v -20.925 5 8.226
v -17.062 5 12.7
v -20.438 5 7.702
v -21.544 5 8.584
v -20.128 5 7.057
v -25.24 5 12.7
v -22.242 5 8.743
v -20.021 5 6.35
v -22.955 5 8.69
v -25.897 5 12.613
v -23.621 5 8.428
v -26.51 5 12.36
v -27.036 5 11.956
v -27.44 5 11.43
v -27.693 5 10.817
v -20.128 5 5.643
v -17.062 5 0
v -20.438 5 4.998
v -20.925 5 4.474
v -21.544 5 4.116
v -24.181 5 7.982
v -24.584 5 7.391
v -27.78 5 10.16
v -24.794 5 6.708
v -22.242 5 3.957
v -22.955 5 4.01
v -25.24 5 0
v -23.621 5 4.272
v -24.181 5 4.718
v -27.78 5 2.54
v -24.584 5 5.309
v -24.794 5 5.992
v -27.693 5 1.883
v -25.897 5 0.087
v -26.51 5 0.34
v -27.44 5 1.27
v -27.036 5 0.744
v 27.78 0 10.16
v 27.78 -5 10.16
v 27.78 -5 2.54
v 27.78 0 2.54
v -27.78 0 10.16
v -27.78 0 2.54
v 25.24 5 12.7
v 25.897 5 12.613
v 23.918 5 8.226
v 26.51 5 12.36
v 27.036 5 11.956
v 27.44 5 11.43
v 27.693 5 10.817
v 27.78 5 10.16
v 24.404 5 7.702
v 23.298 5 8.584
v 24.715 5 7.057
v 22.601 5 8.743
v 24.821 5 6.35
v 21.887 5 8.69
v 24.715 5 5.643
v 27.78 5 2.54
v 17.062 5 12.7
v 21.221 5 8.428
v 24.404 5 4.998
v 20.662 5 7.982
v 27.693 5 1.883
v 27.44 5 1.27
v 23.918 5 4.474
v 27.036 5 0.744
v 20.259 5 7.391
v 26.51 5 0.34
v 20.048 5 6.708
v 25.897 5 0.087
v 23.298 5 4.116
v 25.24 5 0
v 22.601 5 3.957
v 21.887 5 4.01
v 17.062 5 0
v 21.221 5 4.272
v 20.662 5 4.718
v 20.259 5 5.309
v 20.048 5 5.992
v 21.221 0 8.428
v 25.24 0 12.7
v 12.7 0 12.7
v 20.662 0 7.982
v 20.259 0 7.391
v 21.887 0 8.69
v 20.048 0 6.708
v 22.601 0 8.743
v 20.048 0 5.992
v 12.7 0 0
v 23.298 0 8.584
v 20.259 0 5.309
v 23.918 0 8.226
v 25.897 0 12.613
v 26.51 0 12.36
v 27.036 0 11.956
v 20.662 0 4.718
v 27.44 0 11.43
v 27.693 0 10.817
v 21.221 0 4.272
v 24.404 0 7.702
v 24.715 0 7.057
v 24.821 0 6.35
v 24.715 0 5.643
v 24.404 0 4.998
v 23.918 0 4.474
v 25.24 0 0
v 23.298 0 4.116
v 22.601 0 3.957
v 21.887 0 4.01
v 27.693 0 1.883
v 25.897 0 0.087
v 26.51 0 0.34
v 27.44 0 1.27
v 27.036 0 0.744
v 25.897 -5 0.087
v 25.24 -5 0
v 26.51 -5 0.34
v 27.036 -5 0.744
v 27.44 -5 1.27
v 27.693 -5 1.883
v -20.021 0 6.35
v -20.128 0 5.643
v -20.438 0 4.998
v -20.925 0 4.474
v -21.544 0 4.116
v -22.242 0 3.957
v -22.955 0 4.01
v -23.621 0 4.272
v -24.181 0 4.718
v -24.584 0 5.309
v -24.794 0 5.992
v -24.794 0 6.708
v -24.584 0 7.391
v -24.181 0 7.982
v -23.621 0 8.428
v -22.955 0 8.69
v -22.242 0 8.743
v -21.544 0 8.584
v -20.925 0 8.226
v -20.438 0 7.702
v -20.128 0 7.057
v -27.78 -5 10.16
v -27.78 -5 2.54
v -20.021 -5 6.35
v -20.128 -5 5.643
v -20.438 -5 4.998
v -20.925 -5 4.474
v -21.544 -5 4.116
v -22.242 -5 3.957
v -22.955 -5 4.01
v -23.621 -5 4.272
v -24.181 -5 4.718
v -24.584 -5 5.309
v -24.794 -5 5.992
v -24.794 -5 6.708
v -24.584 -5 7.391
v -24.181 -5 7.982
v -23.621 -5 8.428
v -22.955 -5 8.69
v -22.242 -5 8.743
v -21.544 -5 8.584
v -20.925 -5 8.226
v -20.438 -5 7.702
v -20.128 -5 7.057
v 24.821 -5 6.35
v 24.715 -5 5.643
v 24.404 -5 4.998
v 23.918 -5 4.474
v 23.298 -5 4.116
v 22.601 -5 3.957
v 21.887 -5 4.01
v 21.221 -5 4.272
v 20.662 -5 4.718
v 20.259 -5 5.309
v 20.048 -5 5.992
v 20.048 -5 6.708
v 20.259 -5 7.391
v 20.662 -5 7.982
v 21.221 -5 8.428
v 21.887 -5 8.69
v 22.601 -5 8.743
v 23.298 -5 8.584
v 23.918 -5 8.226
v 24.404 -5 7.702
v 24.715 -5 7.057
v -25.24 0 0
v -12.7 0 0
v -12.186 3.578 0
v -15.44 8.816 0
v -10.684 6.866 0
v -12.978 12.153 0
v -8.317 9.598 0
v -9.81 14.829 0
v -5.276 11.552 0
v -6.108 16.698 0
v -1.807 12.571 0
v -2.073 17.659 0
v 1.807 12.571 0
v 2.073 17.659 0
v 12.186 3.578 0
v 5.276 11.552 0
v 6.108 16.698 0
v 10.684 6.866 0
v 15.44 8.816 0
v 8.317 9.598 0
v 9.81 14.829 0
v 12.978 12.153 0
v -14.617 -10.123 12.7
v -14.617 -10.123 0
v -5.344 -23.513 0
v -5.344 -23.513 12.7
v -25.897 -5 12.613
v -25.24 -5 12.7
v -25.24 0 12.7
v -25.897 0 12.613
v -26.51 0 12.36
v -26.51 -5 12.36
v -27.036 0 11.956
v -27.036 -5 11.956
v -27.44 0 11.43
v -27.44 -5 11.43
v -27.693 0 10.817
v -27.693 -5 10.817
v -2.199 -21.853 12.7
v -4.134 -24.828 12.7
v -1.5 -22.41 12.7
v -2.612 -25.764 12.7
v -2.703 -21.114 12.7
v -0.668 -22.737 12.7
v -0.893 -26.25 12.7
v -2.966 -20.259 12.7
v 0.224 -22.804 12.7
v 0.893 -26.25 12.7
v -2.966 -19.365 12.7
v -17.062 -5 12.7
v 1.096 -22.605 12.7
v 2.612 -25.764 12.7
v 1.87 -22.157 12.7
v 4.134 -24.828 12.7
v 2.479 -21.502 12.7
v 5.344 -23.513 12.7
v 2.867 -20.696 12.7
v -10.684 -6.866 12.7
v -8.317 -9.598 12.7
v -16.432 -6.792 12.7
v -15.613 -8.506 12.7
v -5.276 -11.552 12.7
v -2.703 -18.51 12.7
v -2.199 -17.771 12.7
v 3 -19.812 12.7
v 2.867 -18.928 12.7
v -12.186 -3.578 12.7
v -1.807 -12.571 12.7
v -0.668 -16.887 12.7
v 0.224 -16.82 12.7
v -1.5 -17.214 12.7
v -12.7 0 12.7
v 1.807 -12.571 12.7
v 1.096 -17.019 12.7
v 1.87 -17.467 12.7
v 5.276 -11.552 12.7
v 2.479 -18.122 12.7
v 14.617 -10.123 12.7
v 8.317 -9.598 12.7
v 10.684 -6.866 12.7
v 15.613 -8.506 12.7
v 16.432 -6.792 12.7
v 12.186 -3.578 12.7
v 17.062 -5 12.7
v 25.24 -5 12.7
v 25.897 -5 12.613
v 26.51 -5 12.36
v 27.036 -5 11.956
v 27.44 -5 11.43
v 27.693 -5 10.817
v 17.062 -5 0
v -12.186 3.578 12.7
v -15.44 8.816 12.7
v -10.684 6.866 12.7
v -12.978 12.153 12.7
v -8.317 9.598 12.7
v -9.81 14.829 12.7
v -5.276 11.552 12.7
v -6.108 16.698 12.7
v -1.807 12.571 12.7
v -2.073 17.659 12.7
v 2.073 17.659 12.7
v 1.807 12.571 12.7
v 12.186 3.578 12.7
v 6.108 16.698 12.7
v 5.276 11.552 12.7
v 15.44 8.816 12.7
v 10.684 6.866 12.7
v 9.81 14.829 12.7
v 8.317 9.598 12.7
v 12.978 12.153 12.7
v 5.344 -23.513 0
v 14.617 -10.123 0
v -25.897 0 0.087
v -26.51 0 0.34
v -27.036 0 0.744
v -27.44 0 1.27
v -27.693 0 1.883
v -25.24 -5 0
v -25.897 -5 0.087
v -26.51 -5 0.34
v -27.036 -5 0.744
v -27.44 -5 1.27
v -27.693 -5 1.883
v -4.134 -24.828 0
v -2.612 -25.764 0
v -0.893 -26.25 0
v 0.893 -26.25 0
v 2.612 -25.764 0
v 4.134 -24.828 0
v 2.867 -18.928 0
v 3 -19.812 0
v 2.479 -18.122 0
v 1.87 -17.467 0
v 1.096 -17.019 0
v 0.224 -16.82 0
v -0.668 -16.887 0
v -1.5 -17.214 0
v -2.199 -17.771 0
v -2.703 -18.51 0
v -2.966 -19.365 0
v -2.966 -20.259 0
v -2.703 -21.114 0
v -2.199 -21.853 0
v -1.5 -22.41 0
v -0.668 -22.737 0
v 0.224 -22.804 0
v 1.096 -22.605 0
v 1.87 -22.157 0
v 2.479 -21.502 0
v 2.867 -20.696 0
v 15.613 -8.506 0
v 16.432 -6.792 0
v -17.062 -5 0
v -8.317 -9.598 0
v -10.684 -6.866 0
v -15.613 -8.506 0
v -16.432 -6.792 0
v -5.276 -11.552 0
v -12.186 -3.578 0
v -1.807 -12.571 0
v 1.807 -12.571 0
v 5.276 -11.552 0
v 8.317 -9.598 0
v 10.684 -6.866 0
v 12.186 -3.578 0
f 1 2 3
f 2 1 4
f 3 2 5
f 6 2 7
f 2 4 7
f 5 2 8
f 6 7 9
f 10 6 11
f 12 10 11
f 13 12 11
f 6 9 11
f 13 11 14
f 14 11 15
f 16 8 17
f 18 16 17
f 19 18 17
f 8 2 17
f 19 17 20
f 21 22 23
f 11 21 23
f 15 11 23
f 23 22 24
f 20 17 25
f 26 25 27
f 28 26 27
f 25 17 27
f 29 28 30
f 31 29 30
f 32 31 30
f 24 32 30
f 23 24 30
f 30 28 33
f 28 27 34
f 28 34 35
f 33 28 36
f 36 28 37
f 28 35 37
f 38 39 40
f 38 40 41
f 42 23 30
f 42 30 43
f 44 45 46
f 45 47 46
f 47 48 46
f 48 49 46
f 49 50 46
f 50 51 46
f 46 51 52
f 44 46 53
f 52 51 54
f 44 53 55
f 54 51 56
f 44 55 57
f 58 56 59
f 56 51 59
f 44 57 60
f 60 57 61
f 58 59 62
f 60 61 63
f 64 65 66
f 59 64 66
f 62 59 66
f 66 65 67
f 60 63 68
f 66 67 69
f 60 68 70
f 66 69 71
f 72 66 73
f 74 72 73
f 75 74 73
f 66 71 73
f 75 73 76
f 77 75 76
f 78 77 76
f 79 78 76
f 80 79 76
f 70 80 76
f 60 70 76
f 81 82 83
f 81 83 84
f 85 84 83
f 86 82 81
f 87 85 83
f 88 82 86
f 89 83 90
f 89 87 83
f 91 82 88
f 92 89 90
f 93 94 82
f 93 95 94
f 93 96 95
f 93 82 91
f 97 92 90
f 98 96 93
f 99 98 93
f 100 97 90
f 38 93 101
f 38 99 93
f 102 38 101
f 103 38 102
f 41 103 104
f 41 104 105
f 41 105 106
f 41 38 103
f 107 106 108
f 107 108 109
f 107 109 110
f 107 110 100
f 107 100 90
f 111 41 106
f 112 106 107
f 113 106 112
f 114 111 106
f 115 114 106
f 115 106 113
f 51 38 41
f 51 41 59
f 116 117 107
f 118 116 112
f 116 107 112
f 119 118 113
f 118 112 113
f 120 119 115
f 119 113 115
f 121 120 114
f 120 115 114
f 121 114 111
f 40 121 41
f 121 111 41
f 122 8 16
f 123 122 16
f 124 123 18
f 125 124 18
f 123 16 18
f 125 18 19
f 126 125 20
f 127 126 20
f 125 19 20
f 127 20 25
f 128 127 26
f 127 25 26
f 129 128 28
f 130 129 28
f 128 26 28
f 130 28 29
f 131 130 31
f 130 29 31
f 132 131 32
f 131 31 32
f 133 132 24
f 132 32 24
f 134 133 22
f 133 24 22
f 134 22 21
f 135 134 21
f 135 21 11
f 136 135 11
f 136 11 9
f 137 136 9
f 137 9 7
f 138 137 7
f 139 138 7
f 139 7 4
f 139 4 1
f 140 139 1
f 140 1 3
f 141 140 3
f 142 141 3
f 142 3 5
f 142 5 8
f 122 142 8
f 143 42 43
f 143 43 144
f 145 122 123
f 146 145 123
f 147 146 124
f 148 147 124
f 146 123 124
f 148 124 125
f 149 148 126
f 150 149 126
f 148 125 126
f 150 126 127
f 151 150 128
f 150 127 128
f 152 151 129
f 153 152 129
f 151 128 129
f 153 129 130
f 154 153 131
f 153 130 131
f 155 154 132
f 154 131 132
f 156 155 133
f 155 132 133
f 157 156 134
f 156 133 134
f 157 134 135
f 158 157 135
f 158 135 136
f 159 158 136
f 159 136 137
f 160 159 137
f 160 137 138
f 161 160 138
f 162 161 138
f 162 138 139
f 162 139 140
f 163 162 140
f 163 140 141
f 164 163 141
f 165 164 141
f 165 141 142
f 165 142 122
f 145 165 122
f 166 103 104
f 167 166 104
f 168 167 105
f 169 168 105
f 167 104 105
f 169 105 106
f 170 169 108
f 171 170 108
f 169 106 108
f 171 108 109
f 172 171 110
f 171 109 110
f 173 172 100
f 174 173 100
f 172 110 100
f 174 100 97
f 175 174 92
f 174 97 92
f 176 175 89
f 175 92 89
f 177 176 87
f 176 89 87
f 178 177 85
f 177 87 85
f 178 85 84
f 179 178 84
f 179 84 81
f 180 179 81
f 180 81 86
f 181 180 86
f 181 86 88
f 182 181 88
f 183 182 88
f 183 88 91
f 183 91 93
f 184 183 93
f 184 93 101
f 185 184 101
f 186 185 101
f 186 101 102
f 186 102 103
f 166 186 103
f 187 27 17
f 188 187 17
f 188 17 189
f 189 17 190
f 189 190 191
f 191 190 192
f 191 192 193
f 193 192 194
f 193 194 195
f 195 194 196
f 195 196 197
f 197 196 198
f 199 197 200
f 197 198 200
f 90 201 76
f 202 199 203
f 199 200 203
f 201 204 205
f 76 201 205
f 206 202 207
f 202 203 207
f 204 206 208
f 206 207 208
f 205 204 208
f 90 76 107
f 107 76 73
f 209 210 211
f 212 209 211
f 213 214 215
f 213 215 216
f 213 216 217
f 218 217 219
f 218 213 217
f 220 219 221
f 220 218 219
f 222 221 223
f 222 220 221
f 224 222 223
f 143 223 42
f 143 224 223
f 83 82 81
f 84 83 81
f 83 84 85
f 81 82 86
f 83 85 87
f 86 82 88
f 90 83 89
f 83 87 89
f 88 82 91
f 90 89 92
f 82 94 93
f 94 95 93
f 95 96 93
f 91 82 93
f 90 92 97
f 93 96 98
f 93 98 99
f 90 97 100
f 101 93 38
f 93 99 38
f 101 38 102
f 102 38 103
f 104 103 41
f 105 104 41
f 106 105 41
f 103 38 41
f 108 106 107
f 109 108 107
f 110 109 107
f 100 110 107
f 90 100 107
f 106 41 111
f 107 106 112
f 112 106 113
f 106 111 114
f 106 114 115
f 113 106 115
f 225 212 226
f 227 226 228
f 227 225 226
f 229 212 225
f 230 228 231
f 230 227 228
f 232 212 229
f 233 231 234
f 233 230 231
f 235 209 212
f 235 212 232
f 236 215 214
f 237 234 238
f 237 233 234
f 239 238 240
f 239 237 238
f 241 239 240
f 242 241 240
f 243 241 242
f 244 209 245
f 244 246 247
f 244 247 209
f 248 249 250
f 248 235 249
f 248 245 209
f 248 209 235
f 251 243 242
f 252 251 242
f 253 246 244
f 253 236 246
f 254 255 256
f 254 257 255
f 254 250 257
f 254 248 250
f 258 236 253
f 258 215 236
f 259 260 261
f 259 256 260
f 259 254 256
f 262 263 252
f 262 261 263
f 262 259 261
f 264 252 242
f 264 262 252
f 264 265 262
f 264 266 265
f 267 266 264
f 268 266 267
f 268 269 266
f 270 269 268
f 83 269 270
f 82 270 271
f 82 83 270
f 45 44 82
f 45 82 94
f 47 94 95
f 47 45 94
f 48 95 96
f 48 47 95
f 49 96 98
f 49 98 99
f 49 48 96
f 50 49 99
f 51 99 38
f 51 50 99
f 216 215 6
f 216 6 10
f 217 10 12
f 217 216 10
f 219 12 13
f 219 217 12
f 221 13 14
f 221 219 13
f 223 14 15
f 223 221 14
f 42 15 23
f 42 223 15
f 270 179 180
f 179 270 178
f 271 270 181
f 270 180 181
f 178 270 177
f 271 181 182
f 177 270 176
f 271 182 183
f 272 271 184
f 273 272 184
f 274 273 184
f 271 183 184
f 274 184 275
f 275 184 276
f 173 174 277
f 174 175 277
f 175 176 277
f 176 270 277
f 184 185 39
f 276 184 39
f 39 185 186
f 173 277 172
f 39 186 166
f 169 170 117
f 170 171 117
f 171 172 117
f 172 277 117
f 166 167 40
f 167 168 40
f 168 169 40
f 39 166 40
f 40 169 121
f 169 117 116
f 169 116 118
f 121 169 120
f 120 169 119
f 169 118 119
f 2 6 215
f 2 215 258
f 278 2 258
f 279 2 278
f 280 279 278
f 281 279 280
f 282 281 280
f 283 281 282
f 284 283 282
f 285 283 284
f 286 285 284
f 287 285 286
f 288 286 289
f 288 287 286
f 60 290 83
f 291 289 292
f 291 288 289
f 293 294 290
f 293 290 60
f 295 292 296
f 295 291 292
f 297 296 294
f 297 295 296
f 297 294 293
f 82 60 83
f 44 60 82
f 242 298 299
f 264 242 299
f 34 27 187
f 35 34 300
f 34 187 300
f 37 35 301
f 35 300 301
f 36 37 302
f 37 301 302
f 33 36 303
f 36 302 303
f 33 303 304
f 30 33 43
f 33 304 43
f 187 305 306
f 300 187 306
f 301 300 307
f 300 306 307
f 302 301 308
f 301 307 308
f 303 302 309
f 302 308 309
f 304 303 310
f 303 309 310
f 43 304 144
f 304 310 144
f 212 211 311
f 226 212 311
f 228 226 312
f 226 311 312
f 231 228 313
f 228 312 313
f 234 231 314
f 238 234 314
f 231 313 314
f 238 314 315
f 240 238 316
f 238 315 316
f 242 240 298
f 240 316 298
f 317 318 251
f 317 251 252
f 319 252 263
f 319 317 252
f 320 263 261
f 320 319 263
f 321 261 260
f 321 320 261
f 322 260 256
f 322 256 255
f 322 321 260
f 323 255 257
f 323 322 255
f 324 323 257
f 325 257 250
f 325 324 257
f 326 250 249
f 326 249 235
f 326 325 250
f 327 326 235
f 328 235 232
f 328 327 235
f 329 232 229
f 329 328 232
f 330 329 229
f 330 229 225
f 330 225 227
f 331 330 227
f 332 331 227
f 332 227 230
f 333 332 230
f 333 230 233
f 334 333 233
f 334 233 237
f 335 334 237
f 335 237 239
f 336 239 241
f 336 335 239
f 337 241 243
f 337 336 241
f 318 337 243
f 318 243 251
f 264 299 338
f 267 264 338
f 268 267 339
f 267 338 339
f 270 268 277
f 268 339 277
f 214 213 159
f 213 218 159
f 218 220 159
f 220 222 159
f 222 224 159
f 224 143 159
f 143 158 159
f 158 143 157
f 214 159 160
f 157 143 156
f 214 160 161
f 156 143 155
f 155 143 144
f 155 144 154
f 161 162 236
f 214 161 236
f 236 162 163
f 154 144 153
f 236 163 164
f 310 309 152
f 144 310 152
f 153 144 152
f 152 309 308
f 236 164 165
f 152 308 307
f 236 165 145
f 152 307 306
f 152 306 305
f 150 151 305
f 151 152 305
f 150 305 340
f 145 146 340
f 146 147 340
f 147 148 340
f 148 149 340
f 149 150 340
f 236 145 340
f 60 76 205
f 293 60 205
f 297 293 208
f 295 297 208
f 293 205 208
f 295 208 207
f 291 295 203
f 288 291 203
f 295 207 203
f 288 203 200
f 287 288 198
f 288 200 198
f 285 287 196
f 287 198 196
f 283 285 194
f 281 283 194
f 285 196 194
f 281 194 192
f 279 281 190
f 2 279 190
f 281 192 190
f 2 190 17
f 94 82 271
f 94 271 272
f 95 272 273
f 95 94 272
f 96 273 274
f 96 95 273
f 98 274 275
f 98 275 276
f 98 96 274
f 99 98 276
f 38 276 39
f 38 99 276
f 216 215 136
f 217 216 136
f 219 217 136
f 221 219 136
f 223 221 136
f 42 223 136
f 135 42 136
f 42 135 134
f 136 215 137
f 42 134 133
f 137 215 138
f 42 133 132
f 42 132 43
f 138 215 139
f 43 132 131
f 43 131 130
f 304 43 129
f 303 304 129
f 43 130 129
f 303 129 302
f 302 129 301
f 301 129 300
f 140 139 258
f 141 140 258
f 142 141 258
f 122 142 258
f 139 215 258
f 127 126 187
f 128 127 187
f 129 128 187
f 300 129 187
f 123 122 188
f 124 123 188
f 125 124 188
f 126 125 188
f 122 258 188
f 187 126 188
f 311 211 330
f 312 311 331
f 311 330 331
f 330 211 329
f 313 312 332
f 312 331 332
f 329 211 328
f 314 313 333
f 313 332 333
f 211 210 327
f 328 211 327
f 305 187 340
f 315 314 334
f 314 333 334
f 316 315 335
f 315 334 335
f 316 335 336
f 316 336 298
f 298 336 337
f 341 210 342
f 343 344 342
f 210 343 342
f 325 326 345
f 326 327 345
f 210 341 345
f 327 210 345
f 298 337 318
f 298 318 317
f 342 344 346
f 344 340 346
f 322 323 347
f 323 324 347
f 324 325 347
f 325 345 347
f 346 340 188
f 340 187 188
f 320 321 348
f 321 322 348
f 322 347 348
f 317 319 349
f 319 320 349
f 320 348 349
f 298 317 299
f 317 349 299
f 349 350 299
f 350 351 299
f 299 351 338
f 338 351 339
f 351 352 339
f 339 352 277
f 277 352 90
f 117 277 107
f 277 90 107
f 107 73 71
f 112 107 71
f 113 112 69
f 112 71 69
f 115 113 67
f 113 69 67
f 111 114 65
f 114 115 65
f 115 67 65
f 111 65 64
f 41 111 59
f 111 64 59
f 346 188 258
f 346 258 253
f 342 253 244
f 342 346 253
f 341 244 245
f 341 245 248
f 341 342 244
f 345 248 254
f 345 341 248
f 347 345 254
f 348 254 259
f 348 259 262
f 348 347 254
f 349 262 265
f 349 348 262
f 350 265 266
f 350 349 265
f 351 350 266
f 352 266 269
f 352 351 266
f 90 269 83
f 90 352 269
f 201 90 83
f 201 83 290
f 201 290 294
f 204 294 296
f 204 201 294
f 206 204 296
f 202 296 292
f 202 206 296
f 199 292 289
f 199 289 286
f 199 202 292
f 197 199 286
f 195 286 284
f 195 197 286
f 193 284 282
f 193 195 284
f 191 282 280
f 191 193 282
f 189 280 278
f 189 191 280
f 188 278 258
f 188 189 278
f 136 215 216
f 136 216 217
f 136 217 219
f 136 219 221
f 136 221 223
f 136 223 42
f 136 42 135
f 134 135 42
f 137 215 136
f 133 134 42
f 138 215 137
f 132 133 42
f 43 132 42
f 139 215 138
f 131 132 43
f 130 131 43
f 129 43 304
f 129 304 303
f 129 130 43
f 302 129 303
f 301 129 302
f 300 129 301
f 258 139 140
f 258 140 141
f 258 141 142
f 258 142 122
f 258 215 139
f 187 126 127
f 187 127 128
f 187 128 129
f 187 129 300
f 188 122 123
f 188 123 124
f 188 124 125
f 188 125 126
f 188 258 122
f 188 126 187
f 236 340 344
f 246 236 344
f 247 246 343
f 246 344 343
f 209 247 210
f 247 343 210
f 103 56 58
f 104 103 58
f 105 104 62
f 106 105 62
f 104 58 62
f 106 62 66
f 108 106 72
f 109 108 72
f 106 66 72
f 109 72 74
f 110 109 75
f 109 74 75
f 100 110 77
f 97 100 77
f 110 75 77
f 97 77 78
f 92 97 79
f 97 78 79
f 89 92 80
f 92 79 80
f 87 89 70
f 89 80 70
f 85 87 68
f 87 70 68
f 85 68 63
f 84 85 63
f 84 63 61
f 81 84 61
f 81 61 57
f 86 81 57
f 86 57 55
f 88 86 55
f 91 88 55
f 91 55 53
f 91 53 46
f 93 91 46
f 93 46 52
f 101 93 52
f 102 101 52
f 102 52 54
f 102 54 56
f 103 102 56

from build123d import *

# Parameters (mm, degrees)
SKETCH1_R            = 12.7
SKETCH1_R_2          = 3
BOSS_EXTRUDE1_DEPTH  = 12.7
M4_CLEARANCE_HOLE1_D = 4.8
FILLET1_R            = 2.54


with BuildPart() as part:
    # Sketch1 → Boss-Extrude1 (new body)
    with BuildSketch(Plane.XY):
        with BuildLine():
            ThreePointArc((-5.343610447, -23.512787402), (0, -26.312), (5.343610447, -23.512787402))
            Line((5.343610447, -23.512787402), (14.616829807, -10.123076923))
            ThreePointArc((14.616829807, -10.123076923), (16.04544261, -7.6597762), (17.062485165, -5))
            Line((17.062485165, -5), (27.78, -5))
            Line((27.78, -5), (27.78, 5))
            Line((27.78, 5), (17.062485165, 5))
            ThreePointArc((17.062485165, 5), (0, 17.78), (-17.062485165, 5))
            Line((-17.062485165, 5), (-27.78, 5))
            Line((-27.78, 5), (-27.78, -5))
            Line((-27.78, -5), (-17.062485165, -5))
            ThreePointArc((-17.062485165, -5), (-16.04544261, -7.6597762), (-14.616829807, -10.123076923))
            Line((-14.616829807, -10.123076923), (-5.343610447, -23.512787402))
        make_face()
        Circle(SKETCH1_R, mode=Mode.SUBTRACT)
        with Locations((0, -19.812)):
            Circle(SKETCH1_R_2, mode=Mode.SUBTRACT)
    extrude(amount=BOSS_EXTRUDE1_DEPTH)

    # M4 Clearance Hole1 (through all)
    with Locations(Plane(origin=(0, -5, 0), x_dir=(-1, 0, 0), z_dir=(0, -1, 0))):
        with Locations((-22.421242582, -6.35), (22.421242582, -6.35)):
            Hole(M4_CLEARANCE_HOLE1_D / 2)

    # Fillet1
    fillet1_edges = [part.edges().sort_by_distance(p)[0] for p in [
        (-27.78, 0, 0),
        (27.78, 0, 12.7),
        (27.78, 0, 0),
        (-27.78, 0, 12.7),
    ]]
    fillet(fillet1_edges, radius=FILLET1_R)


with BuildPart() as body_2:
    # Split1: the piece on the far side of the plane
    add(part.part)
    split(bisect_by=Plane(origin=(0, 0, 0), x_dir=(0, 0, -1), z_dir=(0, -1, 0)), keep=Keep.BOTTOM)


with BuildPart() as part_1:
    add(part.part)

    # Split1
    split(bisect_by=Plane(origin=(0, 0, 0), x_dir=(0, 0, -1), z_dir=(0, -1, 0)), keep=Keep.TOP)


solid = Compound([body_2.part, part_1.part])
